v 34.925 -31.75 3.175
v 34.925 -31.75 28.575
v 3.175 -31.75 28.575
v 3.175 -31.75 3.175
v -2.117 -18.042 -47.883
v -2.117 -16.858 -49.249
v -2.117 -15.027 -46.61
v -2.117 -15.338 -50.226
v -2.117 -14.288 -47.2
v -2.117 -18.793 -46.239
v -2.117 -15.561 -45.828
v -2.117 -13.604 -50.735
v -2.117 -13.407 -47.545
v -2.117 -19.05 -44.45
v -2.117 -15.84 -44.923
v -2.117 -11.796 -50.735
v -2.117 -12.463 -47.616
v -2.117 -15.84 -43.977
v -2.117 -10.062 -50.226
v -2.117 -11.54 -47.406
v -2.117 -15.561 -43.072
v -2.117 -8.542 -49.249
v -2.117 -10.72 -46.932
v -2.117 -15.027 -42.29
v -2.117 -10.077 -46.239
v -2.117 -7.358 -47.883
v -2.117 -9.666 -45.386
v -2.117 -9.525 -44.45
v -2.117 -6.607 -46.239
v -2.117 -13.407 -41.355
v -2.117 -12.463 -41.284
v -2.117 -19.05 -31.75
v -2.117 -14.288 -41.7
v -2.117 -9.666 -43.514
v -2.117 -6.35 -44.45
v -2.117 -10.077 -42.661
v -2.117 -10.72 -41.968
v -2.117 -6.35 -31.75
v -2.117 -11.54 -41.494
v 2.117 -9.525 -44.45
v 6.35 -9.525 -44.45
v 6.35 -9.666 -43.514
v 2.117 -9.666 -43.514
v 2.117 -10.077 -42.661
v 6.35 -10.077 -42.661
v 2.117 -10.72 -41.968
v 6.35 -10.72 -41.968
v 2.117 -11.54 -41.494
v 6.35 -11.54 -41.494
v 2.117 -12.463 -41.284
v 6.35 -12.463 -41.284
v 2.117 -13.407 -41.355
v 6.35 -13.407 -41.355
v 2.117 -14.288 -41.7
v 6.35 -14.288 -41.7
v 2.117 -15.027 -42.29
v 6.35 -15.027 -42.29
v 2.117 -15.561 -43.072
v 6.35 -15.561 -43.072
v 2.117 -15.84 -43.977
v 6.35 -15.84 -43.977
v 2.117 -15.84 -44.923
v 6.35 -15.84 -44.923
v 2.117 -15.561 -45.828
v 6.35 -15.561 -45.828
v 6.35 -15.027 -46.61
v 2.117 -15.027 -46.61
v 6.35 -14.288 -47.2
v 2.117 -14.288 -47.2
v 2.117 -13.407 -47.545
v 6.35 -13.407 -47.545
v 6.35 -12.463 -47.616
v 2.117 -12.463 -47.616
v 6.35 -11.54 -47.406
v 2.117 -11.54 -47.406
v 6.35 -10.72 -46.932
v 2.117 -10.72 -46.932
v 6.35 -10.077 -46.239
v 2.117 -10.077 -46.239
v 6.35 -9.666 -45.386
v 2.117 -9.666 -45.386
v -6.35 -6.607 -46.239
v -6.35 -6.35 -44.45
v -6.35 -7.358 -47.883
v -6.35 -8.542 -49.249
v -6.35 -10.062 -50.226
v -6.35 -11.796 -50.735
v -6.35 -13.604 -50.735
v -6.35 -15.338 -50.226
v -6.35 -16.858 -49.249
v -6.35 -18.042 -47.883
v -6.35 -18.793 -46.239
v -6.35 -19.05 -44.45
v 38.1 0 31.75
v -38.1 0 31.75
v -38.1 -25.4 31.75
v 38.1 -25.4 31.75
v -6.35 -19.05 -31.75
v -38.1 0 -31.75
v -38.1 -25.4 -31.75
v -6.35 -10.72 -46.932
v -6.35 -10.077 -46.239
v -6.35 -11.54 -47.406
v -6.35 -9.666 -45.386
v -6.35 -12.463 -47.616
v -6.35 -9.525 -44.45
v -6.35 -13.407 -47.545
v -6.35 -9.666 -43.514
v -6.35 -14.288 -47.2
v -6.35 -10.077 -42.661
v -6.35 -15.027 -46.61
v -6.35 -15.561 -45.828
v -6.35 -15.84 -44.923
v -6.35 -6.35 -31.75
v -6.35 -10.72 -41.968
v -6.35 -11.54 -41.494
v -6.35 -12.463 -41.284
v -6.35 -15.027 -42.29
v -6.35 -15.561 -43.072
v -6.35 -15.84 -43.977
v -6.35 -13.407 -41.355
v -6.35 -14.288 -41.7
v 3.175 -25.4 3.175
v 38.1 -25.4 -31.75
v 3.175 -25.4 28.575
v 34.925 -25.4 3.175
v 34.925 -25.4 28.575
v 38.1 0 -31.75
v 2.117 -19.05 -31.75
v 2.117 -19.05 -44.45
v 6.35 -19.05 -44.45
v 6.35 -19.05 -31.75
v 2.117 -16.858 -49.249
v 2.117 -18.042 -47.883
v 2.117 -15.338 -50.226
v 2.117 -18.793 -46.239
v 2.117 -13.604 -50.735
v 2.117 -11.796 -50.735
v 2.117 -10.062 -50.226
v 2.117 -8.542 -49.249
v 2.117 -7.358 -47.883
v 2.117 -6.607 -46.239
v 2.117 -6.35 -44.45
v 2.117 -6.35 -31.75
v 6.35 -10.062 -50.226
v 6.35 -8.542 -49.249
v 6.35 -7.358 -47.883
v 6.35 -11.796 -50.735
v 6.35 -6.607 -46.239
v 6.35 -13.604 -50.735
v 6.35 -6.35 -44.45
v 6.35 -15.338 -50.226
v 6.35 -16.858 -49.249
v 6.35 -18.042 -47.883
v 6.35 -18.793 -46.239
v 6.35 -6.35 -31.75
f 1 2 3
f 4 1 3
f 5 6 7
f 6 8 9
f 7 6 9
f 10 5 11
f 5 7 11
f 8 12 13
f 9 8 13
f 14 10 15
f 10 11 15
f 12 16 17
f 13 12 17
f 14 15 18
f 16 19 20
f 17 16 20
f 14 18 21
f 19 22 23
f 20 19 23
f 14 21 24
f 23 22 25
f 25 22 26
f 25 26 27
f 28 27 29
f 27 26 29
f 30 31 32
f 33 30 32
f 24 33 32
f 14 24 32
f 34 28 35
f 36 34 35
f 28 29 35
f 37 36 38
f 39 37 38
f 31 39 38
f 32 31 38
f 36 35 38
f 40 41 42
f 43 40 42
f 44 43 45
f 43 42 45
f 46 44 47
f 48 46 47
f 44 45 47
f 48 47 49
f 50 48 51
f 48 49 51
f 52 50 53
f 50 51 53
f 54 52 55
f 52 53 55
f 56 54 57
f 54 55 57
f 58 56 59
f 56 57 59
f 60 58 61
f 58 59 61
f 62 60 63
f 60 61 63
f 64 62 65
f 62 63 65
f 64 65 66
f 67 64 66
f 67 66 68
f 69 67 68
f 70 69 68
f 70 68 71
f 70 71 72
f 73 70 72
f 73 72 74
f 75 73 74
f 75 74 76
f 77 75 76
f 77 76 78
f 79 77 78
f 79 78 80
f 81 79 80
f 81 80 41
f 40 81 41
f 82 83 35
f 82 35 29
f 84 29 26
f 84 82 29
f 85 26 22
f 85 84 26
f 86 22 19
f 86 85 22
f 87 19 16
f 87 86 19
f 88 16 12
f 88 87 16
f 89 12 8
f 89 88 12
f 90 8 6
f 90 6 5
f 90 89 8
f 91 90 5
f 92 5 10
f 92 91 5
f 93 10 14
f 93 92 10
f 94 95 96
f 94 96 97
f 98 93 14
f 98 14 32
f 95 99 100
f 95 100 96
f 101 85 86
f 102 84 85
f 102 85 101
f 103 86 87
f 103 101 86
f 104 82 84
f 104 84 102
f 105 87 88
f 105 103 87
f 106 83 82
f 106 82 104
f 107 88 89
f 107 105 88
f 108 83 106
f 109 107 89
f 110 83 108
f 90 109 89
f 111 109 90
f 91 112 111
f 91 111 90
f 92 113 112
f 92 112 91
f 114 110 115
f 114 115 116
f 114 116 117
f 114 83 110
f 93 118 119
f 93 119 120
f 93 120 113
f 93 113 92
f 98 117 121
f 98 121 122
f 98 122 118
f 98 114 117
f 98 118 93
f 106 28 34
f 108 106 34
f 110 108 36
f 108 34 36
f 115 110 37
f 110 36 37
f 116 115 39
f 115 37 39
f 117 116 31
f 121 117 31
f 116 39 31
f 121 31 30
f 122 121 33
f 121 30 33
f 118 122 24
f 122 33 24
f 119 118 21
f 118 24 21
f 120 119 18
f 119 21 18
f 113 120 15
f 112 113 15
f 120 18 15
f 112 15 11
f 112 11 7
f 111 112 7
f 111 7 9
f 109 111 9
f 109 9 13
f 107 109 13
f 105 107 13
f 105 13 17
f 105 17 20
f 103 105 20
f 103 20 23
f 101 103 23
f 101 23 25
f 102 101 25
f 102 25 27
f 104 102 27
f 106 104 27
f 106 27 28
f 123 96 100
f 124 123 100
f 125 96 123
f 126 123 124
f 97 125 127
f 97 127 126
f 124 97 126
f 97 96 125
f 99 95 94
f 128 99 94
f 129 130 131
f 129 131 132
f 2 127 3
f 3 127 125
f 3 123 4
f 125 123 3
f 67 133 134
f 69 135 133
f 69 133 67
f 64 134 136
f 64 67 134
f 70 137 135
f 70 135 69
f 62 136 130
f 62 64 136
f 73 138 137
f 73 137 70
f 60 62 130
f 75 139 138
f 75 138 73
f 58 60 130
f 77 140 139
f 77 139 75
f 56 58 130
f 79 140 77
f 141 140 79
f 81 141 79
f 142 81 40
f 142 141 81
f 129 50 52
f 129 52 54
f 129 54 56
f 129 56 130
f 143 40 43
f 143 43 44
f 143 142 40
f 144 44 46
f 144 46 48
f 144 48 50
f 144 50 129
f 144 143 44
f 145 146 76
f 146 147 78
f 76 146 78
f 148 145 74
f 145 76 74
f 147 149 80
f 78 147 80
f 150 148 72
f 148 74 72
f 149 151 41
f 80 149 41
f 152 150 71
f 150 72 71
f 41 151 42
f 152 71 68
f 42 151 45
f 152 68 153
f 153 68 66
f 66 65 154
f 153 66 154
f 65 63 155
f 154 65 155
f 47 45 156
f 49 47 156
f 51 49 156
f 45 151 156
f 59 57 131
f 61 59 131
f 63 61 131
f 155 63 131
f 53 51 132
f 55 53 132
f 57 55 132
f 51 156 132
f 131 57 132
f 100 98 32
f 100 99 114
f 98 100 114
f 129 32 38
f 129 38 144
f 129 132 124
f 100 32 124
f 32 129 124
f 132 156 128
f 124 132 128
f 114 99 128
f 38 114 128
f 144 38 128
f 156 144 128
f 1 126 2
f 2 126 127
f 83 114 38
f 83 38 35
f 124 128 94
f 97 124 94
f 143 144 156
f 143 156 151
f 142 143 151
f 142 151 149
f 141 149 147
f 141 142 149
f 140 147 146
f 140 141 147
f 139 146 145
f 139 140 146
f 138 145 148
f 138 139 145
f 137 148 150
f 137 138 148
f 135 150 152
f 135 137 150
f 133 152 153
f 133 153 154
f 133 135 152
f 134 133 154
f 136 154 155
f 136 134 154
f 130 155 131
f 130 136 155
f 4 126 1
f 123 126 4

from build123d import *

# Parameters (mm, degrees)
F0_W      = 76.2
F0_H      = 63.5
F0_W_2    = 31.75
F0_H_2    = 25.4
F1_DEPTH  = 25.4
F2_W      = 31.75
F2_H      = 25.4
F3_DEPTH  = 31.75
F6_DEPTH  = 6.35
F7_W      = 4.2333333333
F7_H      = 19.05
F8_DEPTH  = 31.751
F9_R      = 3.175
F10_DEPTH = 44.451


with BuildPart() as f1:
    # F0 (on Front) → F1 (new body)
    with BuildSketch(Plane.XZ):
        Rectangle(F0_W, F0_H)
        with Locations((19.05, 15.875)):
            Rectangle(F0_W_2, F0_H_2, mode=Mode.SUBTRACT)
    extrude(amount=F1_DEPTH)

    # F2 (on face) → F3 (join)
    with BuildSketch(Plane(origin=(0, 0, 0), x_dir=(-1, 0, 0), z_dir=(0, 1, 0))):
        with Locations((-19.05, 15.875)):
            Rectangle(F2_W, F2_H)
    extrude(amount=-F3_DEPTH)

    # F5 (on offset) → F6 (join, symmetric)
    with BuildSketch(Plane(origin=(0, 0, 0), x_dir=(0, -1, 0), z_dir=(-1, 0, 0))):
        with BuildLine():
            Line((6.35, -31.75), (6.35, -44.45))
            ThreePointArc((6.35, -44.45), (12.7, -50.8), (19.05, -44.45))
            Line((19.05, -44.45), (19.05, -31.75))
            Line((19.05, -31.75), (6.35, -31.75))
        make_face()
    extrude(amount=F6_DEPTH, both=True)

    # F7 (on Front) → F8 (cut, through all)
    with BuildSketch(Plane.XZ):
        with Locations((0, -41.275)):
            Rectangle(F7_W, F7_H)
    extrude(amount=F8_DEPTH, mode=Mode.SUBTRACT)

    # F9 (on face) → F10 (cut, through all)
    with BuildSketch(Plane.YZ.offset(6.35)):
        with Locations((-12.7, -44.45)):
            Circle(F9_R)
    extrude(amount=-F10_DEPTH, mode=Mode.SUBTRACT)


solid = f1.part
